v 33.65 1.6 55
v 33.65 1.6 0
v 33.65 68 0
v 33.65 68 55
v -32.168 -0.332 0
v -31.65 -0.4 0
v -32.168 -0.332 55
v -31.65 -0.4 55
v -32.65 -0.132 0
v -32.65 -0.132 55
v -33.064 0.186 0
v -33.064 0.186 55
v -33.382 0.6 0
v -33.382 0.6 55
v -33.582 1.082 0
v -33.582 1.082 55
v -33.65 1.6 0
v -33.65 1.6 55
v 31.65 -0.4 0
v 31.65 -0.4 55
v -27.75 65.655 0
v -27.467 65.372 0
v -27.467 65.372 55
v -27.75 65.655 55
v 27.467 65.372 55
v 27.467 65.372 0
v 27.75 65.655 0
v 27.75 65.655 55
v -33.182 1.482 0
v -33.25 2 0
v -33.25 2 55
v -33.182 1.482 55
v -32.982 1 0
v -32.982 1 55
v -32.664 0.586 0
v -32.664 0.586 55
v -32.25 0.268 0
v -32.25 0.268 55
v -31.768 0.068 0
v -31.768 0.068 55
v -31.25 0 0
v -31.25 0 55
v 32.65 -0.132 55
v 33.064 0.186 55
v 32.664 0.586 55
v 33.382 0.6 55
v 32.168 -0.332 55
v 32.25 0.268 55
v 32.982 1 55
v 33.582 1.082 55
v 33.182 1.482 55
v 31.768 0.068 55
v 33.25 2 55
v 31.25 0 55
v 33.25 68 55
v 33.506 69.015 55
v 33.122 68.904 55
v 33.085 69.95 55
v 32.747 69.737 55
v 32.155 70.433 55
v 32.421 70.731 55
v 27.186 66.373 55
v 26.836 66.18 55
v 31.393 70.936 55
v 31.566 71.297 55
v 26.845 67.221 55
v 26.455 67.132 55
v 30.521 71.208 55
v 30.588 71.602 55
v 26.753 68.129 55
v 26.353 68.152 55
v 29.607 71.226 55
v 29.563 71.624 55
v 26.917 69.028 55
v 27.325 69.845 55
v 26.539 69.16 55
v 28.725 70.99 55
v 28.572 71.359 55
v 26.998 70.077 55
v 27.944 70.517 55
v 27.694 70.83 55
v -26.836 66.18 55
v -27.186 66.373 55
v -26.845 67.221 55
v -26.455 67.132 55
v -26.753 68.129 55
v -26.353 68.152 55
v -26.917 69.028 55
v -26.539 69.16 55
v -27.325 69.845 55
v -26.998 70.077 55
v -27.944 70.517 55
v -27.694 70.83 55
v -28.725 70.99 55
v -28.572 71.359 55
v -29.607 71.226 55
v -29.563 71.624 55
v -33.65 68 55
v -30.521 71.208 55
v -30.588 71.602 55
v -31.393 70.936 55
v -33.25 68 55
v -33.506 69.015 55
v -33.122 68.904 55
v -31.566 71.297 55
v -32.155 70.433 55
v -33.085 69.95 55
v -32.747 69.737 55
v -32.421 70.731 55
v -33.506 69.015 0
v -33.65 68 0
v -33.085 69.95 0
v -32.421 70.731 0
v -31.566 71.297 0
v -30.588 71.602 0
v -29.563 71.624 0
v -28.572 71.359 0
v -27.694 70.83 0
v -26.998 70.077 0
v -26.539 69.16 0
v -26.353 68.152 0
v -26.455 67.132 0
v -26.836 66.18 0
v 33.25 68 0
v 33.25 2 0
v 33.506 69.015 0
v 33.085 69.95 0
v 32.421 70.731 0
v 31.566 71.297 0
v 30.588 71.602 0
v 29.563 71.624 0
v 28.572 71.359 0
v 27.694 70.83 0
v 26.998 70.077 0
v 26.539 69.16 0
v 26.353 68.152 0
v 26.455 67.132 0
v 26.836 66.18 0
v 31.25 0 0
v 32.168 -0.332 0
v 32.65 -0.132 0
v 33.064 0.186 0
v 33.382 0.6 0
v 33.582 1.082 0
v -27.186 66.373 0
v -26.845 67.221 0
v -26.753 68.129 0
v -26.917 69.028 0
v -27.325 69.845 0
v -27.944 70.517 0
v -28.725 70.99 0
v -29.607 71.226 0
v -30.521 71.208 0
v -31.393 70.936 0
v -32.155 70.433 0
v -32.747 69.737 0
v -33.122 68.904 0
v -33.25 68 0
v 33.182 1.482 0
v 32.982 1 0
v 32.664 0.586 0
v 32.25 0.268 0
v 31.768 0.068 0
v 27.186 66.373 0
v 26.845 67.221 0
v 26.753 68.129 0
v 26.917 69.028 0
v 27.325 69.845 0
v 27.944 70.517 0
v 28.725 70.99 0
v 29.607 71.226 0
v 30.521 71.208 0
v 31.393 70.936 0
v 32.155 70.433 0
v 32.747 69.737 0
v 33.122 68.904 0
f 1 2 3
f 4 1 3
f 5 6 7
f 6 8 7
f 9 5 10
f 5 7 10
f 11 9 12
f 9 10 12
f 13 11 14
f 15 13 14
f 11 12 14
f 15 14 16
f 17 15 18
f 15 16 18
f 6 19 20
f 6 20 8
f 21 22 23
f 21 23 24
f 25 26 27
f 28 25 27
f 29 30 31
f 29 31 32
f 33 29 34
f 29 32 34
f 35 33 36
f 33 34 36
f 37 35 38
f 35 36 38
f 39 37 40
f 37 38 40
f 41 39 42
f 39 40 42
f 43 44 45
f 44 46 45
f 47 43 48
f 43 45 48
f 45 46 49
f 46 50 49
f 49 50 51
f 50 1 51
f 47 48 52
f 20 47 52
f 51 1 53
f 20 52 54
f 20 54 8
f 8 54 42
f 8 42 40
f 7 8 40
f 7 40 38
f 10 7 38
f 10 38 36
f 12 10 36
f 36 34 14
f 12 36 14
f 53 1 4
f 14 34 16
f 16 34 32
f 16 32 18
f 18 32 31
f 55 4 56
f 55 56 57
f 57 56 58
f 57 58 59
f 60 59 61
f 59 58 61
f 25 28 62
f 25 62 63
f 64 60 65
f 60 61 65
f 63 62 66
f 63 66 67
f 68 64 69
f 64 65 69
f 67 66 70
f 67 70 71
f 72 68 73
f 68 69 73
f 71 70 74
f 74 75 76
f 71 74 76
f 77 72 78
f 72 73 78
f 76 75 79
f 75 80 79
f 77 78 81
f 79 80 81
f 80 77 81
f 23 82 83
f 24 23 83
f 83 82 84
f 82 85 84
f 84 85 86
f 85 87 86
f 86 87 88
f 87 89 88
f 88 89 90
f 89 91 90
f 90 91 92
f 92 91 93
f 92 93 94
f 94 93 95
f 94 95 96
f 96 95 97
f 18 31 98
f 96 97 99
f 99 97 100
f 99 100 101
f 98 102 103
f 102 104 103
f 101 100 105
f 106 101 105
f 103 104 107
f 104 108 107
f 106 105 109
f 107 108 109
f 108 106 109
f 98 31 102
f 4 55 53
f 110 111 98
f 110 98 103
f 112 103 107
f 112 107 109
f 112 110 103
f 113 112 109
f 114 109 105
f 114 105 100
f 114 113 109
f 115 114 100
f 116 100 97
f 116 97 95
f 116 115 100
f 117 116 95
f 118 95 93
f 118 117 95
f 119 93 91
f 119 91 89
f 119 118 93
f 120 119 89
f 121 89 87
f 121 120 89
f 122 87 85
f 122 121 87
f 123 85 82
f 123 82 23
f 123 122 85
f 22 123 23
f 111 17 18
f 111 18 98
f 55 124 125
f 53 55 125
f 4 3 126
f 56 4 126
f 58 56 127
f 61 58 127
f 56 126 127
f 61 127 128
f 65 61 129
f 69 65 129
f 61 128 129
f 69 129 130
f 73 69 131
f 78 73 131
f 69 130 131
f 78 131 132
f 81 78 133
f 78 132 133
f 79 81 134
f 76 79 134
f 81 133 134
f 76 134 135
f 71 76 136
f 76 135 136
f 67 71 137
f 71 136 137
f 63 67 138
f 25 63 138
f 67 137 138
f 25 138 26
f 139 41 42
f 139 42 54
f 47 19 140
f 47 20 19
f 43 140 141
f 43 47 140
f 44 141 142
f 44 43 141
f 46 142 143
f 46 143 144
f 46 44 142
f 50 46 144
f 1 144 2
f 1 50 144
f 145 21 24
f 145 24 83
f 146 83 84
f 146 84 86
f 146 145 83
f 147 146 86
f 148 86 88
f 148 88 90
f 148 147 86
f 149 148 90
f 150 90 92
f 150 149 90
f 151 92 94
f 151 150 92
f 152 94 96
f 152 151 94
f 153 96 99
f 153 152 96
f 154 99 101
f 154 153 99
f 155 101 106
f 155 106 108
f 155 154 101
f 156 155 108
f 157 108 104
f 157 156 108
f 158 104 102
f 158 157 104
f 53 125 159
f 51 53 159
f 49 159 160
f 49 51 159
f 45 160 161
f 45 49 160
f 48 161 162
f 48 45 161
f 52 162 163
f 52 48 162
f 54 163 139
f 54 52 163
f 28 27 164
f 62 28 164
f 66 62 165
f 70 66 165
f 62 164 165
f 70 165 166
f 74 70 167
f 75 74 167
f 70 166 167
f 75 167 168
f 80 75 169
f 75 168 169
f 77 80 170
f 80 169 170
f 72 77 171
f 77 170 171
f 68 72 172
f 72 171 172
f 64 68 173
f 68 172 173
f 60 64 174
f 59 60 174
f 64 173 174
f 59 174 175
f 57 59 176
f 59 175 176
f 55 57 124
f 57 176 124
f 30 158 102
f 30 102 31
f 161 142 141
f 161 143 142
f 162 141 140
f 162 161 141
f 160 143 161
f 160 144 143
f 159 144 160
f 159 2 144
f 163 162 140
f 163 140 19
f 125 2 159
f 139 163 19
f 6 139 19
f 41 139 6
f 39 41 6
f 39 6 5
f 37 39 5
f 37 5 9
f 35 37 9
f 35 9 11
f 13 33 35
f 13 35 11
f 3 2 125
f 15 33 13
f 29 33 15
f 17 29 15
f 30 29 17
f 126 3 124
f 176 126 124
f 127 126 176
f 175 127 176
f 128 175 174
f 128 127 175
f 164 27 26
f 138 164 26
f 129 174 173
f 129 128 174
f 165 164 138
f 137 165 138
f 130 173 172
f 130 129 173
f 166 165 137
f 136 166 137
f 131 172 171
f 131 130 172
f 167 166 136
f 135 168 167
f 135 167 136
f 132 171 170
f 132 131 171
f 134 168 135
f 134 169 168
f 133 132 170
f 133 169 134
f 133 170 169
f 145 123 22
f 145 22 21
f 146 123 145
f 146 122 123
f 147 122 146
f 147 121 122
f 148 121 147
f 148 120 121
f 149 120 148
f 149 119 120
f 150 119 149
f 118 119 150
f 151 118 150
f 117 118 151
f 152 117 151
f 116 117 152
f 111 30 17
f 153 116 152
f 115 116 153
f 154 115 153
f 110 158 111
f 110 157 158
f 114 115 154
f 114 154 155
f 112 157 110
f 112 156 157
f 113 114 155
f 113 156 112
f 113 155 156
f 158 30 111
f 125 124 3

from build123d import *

# Parameters (mm, degrees)
BOSS_EXTRU_2_DEPTH = 55
CONG_2_R           = 2


with BuildPart() as part:
    # Esquisse1 → Boss.-Extru.2 (new body)
    with BuildSketch(Plane.XY):
        with BuildLine():
            Line((33.25, 68), (33.25, 34))
            Line((33.25, 34), (33.25, 0))
            Line((33.25, 0), (0, 0))
            Line((0, 0), (0, -0.4))
            Line((0, -0.4), (33.65, -0.4))
            Line((33.65, -0.4), (33.65, 34))
            Line((33.65, 34), (33.65, 68))
            ThreePointArc((33.65, 68), (28.572164781, 71.359134798), (27.46710324, 65.37189536))
            Line((27.46710324, 65.37189536), (27.75, 65.65479212))
            ThreePointArc((27.75, 65.65479212), (28.725245122, 70.989565186), (33.25, 68))
        make_face()
    extrude(amount=BOSS_EXTRU_2_DEPTH)

    # Congé2
    cong_2_edges = [part.edges().sort_by_distance(p)[0] for p in [
        (33.25, 0, 27.5),
        (33.65, -0.4, 27.5),
    ]]
    fillet(cong_2_edges, radius=CONG_2_R)

    # Symétrie2: part across plane


with BuildPart() as part_1:
    add(part.part)
    add(part.part.mirror(Plane(origin=(0, -0.4, 55), x_dir=(0, 0, 1), z_dir=(1, 0, 0))))


solid = part_1.part
